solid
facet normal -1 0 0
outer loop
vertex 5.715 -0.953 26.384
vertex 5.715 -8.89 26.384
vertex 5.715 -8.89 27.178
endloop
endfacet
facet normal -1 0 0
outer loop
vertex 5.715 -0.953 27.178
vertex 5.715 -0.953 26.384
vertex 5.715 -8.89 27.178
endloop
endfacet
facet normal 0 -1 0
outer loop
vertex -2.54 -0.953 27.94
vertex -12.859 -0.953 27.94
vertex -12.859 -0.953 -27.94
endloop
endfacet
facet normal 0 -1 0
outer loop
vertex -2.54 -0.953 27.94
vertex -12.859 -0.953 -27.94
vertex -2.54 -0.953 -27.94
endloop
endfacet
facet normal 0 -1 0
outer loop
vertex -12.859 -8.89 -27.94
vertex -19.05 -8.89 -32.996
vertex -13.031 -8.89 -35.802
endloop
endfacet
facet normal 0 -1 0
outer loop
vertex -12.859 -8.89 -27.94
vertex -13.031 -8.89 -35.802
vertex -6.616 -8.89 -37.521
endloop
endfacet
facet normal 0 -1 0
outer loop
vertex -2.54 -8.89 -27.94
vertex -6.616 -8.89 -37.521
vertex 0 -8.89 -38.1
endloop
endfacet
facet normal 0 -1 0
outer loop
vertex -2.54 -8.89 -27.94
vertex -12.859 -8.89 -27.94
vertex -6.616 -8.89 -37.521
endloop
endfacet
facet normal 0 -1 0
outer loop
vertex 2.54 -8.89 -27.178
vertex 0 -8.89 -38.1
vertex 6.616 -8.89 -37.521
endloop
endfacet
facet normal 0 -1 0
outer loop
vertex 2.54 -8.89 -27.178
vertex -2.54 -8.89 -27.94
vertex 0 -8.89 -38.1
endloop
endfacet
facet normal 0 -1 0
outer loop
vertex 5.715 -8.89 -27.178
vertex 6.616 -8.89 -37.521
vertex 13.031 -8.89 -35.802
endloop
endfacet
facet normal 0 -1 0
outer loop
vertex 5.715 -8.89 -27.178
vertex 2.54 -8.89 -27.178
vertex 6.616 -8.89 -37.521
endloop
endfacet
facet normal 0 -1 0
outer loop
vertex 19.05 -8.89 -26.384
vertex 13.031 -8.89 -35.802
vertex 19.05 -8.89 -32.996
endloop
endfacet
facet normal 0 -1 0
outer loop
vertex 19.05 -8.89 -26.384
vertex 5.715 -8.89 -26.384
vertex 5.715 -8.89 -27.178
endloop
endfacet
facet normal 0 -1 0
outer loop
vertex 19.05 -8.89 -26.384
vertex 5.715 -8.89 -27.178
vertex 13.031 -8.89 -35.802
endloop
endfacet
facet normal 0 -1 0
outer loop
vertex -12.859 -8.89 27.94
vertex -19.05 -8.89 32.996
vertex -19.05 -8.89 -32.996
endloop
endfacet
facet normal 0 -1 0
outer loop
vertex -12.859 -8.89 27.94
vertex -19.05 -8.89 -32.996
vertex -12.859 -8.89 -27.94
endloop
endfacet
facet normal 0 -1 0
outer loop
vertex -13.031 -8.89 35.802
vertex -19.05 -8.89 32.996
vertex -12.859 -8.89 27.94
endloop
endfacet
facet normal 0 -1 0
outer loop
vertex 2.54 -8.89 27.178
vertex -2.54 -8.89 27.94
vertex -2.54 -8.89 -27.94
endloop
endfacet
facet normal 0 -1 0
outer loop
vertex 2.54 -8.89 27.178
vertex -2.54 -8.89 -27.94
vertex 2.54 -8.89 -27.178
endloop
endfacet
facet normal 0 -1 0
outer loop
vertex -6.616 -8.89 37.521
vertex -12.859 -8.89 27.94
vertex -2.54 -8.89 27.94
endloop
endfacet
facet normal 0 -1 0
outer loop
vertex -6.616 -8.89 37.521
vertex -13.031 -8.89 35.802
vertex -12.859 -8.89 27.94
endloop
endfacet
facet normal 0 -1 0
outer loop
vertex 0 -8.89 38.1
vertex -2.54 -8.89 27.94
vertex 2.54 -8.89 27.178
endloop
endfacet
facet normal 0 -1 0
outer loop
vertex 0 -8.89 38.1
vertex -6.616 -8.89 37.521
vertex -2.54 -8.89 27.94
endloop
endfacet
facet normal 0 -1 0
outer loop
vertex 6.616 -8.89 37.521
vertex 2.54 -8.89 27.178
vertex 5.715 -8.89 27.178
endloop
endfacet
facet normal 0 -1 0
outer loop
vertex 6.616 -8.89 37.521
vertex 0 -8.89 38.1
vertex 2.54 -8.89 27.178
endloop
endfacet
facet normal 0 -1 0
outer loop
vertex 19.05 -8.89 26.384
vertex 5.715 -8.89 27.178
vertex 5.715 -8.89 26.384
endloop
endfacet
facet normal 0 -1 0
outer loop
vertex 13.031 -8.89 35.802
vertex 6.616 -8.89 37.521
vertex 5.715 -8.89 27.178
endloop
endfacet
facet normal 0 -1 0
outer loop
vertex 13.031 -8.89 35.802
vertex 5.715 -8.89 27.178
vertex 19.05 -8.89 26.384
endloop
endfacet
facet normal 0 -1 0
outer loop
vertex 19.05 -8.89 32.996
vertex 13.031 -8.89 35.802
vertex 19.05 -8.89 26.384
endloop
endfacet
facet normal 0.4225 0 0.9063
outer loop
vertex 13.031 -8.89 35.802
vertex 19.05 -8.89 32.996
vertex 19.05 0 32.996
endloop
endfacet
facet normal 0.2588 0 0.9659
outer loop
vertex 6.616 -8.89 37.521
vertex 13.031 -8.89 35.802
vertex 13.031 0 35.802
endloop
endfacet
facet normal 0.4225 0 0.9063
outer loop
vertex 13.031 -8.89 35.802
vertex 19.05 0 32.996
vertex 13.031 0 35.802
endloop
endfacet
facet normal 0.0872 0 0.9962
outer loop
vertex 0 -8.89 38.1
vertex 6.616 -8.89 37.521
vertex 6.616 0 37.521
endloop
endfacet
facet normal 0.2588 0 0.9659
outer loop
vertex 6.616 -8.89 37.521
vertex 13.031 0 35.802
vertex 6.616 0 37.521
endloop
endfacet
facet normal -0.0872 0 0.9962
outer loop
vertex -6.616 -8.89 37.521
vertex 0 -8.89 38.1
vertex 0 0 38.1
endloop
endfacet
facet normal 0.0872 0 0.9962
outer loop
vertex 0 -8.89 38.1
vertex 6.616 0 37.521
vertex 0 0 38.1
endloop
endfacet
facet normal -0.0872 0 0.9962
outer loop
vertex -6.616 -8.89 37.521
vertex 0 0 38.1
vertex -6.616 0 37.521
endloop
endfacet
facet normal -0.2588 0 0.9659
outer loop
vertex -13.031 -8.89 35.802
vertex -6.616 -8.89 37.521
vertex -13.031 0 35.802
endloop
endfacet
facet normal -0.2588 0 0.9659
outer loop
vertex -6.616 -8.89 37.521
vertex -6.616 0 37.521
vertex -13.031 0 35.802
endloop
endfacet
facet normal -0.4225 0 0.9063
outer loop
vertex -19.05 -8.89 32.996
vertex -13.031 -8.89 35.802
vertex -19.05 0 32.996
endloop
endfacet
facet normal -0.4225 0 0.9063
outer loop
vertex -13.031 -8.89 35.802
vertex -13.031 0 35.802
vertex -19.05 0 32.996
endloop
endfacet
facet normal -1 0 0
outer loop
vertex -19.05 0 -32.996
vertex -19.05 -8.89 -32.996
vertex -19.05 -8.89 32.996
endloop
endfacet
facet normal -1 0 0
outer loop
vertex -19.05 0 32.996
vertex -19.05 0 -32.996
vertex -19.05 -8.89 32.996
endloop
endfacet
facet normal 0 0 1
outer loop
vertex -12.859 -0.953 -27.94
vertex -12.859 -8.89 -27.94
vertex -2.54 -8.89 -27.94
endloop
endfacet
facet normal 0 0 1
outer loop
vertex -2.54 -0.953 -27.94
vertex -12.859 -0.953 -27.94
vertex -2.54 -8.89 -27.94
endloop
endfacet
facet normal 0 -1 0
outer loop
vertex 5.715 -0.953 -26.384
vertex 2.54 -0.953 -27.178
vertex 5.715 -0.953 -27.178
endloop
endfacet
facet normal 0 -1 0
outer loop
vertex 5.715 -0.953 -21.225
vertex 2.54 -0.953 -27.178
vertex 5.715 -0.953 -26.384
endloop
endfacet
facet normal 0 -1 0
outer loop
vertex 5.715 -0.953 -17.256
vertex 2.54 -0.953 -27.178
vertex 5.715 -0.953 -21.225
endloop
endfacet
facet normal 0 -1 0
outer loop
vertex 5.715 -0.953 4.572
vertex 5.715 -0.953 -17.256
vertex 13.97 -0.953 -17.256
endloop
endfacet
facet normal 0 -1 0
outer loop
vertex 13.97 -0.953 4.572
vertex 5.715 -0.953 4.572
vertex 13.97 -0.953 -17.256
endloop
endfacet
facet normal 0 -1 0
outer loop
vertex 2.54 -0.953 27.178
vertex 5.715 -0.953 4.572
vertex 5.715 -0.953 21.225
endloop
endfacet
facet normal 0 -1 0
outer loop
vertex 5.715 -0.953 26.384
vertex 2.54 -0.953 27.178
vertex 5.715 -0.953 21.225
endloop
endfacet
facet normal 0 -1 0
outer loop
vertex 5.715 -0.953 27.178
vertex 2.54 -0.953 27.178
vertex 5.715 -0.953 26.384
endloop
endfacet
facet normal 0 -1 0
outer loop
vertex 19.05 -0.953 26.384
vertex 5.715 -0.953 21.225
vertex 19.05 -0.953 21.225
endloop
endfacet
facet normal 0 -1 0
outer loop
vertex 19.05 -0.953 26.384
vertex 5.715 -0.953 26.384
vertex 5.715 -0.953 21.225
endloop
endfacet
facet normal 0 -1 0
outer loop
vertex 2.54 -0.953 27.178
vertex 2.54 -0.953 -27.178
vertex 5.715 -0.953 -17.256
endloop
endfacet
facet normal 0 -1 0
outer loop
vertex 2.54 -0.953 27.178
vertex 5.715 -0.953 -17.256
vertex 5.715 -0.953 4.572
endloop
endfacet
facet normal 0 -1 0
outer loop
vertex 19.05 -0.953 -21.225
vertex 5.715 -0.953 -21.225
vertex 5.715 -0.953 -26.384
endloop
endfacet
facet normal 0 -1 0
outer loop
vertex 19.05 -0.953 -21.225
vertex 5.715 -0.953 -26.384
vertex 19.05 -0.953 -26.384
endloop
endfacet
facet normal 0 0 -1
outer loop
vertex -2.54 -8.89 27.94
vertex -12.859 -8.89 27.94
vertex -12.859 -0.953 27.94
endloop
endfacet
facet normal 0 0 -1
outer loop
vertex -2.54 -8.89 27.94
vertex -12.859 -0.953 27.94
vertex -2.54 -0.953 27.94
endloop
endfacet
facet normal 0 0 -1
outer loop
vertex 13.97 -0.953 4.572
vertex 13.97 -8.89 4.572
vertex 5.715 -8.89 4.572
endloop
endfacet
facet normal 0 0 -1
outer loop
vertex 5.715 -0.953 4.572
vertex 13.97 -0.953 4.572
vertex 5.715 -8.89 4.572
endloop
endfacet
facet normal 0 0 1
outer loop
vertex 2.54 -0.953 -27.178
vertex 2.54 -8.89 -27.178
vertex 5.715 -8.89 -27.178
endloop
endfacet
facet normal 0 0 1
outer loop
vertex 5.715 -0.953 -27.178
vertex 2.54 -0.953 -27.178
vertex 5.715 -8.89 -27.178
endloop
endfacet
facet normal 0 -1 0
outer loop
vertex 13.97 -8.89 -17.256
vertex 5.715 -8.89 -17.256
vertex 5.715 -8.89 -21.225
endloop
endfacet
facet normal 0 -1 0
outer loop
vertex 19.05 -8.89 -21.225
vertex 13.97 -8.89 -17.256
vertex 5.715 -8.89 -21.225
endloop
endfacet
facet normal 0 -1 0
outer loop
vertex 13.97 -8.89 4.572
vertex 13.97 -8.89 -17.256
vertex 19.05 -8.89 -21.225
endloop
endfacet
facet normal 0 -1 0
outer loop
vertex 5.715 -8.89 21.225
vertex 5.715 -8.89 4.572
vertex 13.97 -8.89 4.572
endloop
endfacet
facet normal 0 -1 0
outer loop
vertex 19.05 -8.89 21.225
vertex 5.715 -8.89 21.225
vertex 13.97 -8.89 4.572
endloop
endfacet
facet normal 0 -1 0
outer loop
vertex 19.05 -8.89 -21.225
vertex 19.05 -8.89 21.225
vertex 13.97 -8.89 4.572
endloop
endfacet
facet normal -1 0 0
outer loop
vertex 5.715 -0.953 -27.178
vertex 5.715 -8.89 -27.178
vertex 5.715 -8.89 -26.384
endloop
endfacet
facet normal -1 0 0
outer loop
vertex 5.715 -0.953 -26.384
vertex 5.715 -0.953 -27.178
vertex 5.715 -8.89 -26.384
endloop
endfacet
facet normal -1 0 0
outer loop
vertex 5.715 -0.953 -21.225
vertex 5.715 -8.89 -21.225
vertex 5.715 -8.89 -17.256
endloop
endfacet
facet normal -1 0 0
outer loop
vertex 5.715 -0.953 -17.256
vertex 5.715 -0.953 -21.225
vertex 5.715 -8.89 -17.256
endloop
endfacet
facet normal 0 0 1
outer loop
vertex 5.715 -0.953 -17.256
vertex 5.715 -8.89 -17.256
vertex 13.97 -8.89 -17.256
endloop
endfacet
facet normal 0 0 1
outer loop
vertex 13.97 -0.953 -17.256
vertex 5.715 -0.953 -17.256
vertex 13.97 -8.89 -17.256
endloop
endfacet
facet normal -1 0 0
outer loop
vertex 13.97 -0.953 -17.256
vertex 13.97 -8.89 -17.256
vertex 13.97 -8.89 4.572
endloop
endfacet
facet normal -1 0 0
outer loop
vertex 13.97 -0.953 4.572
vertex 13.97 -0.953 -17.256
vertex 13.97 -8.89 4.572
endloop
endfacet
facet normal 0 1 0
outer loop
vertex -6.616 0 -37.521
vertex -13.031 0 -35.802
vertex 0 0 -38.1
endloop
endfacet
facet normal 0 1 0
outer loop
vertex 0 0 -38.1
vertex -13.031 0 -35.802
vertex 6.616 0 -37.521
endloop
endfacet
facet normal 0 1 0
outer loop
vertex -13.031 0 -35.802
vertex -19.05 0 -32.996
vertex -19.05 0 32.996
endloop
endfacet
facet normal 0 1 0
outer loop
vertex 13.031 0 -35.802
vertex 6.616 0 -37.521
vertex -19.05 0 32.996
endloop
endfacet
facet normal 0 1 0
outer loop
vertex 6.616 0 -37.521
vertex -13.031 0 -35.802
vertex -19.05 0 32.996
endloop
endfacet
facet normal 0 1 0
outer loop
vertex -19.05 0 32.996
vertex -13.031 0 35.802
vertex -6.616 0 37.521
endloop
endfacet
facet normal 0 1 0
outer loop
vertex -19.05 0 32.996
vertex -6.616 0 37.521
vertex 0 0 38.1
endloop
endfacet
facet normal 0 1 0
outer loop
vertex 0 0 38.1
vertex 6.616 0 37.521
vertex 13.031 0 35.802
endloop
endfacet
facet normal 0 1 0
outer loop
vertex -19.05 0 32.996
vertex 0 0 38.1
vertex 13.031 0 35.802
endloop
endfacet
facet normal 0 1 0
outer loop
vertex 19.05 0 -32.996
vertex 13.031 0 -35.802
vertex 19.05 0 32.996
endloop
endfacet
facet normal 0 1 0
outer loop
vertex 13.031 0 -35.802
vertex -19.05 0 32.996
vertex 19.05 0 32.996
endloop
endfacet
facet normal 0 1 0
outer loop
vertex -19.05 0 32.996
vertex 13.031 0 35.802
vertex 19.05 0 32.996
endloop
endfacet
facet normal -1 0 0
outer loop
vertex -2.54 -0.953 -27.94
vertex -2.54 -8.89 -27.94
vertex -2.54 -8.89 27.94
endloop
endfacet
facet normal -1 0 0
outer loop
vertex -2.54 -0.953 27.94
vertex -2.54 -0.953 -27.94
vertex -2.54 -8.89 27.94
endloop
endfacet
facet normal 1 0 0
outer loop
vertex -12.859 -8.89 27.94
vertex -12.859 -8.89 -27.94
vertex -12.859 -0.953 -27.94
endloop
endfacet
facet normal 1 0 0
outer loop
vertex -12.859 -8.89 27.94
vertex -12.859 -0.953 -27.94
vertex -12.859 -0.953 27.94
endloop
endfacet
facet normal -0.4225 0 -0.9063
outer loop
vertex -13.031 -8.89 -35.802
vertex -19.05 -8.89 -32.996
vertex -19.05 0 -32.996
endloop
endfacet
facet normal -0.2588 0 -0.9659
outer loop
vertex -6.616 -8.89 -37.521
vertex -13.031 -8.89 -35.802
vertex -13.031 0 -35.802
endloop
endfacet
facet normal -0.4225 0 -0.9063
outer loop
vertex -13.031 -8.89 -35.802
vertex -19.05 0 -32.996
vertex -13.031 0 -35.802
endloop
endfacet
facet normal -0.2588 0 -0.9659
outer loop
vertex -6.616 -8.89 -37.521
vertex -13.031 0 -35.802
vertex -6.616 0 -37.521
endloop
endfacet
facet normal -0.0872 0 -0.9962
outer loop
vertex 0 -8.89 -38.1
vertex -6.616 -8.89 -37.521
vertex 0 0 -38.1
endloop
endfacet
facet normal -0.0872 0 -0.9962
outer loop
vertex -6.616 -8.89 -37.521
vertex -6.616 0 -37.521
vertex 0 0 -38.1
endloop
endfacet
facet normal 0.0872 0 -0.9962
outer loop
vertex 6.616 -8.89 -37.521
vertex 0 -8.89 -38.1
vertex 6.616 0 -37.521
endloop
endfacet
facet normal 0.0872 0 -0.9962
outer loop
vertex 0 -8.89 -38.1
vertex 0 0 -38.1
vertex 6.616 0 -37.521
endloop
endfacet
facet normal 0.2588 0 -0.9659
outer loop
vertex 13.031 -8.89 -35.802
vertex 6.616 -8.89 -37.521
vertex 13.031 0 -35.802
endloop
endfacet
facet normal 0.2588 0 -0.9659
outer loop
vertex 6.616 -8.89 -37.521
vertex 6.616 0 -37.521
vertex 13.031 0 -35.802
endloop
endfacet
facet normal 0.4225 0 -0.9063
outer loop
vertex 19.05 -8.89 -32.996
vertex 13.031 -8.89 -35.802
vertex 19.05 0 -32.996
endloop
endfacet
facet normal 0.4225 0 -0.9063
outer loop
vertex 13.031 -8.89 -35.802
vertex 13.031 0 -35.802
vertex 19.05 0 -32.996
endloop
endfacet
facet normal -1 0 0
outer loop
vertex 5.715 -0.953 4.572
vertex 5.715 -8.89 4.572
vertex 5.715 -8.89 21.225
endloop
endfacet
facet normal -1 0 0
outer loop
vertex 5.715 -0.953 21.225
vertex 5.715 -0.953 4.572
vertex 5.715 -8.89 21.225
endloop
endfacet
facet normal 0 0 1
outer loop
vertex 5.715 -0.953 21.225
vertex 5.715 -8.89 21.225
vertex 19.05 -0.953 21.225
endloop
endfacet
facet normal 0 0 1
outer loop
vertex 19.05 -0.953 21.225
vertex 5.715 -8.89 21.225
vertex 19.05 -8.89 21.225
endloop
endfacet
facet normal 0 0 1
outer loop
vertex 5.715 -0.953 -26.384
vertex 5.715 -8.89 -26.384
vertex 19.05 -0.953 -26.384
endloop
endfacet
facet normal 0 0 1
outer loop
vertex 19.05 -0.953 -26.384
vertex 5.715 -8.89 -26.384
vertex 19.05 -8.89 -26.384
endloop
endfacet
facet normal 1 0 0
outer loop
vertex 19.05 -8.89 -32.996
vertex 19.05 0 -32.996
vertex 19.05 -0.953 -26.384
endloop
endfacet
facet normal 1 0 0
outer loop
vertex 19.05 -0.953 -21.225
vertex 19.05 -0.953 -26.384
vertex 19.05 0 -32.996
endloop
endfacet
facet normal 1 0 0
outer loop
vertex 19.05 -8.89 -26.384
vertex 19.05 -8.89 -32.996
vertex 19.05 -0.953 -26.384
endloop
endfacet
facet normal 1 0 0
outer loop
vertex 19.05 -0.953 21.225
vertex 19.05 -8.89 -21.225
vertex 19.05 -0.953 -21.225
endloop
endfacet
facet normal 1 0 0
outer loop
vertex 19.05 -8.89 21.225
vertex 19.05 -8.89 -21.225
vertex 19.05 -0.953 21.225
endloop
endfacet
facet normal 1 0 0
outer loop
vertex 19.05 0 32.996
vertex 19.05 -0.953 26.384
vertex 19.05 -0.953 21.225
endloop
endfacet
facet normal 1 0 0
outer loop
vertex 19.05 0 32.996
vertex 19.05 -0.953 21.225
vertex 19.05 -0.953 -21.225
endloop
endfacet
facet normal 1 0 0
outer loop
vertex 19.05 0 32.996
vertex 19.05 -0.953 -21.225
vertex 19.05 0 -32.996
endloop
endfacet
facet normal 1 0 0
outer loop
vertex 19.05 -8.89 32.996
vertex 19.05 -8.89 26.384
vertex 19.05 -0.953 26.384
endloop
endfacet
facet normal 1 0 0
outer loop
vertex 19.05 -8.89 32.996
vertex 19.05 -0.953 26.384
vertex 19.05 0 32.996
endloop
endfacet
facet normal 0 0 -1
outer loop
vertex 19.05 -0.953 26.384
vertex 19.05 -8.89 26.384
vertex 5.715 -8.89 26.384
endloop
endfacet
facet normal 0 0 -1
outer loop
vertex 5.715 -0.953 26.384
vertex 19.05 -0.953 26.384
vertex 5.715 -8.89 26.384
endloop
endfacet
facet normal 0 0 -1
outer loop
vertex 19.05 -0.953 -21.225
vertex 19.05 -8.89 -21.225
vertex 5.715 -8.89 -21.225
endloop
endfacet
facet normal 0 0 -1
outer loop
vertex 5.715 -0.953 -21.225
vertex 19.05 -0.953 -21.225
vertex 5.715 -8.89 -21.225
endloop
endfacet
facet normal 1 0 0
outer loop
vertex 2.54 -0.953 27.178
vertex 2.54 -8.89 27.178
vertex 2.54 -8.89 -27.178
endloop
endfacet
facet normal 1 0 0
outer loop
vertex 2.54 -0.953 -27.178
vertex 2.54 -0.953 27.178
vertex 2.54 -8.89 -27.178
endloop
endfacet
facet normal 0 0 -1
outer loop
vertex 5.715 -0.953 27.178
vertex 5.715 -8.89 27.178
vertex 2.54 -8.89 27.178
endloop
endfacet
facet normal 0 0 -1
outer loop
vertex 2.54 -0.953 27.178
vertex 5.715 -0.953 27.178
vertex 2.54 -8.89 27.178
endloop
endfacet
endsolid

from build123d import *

# Parameters (mm, degrees)
F0_R     = 38.1
F1_DEPTH = 8.89
F2_W     = 10.31875
F2_H     = 55.88
F3_DEPTH = 7.9375
F5_DEPTH = 7.9375
F6_W     = 39.77474
F6_H     = 108.857153
F7_DEPTH = 25.4


with BuildPart() as f1:
    # F0 (on Front) → F1 (new body)
    with BuildSketch(Plane.XZ):
        Circle(F0_R)
    extrude(amount=F1_DEPTH)

    # F2 (on face) → F3 (cut)
    with BuildSketch(Plane.XZ.offset(8.89)):
        with Locations((-7.699375, 0)):
            Rectangle(F2_W, F2_H)
    extrude(amount=-F3_DEPTH, mode=Mode.SUBTRACT)

    # F4 (on face) → F5 (cut)
    with BuildSketch(Plane.XZ.offset(8.89)):
        with BuildLine():
            Line((5.715, 27.178), (2.54, 27.178))
            Line((2.54, 27.178), (2.54, -27.178))
            Line((2.54, -27.178), (5.715, -27.178))
            Line((5.715, -27.178), (5.715, -26.38425))
            Line((5.715, -26.38425), (12.12081, -26.38425))
            Line((12.12081, -26.38425), (27.486021, -26.38425))
            ThreePointArc((27.486021, -26.38425), (29.675547, -23.895018), (31.640396, -21.224875))
            Line((31.640396, -21.224875), (13.97, -21.224875))
            Line((13.97, -21.224875), (12.12081, -21.224875))
            Line((12.12081, -21.224875), (5.715, -21.224875))
            Line((5.715, -21.224875), (5.715, -17.256125))
            Line((5.715, -17.256125), (13.97, -17.256125))
            Line((13.97, -17.256125), (13.97, 4.572))
            Line((13.97, 4.572), (5.715, 4.572))
            Line((5.715, 4.572), (5.715, 21.224875))
            Line((5.715, 21.224875), (12.12081, 21.224875))
            Line((12.12081, 21.224875), (13.97, 21.224875))
            Line((13.97, 21.224875), (31.640396, 21.224875))
            ThreePointArc((31.640396, 21.224875), (29.675547, 23.895018), (27.486021, 26.38425))
            Line((27.486021, 26.38425), (12.12081, 26.38425))
            Line((12.12081, 26.38425), (5.715, 26.38425))
            Line((5.715, 26.38425), (5.715, 27.178))
        make_face()
    extrude(amount=-F5_DEPTH, mode=Mode.SUBTRACT)

    # F6 (on face) → F7 (cut)
    with BuildSketch(Plane.XZ.offset(8.89)):
        with Locations((38.93737, -0.989815)):
            Rectangle(F6_W, F6_H)
        with Locations((-38.93737, -0.989815)):
            Rectangle(F6_W, F6_H)
    extrude(amount=-F7_DEPTH, mode=Mode.SUBTRACT)


solid = f1.part
